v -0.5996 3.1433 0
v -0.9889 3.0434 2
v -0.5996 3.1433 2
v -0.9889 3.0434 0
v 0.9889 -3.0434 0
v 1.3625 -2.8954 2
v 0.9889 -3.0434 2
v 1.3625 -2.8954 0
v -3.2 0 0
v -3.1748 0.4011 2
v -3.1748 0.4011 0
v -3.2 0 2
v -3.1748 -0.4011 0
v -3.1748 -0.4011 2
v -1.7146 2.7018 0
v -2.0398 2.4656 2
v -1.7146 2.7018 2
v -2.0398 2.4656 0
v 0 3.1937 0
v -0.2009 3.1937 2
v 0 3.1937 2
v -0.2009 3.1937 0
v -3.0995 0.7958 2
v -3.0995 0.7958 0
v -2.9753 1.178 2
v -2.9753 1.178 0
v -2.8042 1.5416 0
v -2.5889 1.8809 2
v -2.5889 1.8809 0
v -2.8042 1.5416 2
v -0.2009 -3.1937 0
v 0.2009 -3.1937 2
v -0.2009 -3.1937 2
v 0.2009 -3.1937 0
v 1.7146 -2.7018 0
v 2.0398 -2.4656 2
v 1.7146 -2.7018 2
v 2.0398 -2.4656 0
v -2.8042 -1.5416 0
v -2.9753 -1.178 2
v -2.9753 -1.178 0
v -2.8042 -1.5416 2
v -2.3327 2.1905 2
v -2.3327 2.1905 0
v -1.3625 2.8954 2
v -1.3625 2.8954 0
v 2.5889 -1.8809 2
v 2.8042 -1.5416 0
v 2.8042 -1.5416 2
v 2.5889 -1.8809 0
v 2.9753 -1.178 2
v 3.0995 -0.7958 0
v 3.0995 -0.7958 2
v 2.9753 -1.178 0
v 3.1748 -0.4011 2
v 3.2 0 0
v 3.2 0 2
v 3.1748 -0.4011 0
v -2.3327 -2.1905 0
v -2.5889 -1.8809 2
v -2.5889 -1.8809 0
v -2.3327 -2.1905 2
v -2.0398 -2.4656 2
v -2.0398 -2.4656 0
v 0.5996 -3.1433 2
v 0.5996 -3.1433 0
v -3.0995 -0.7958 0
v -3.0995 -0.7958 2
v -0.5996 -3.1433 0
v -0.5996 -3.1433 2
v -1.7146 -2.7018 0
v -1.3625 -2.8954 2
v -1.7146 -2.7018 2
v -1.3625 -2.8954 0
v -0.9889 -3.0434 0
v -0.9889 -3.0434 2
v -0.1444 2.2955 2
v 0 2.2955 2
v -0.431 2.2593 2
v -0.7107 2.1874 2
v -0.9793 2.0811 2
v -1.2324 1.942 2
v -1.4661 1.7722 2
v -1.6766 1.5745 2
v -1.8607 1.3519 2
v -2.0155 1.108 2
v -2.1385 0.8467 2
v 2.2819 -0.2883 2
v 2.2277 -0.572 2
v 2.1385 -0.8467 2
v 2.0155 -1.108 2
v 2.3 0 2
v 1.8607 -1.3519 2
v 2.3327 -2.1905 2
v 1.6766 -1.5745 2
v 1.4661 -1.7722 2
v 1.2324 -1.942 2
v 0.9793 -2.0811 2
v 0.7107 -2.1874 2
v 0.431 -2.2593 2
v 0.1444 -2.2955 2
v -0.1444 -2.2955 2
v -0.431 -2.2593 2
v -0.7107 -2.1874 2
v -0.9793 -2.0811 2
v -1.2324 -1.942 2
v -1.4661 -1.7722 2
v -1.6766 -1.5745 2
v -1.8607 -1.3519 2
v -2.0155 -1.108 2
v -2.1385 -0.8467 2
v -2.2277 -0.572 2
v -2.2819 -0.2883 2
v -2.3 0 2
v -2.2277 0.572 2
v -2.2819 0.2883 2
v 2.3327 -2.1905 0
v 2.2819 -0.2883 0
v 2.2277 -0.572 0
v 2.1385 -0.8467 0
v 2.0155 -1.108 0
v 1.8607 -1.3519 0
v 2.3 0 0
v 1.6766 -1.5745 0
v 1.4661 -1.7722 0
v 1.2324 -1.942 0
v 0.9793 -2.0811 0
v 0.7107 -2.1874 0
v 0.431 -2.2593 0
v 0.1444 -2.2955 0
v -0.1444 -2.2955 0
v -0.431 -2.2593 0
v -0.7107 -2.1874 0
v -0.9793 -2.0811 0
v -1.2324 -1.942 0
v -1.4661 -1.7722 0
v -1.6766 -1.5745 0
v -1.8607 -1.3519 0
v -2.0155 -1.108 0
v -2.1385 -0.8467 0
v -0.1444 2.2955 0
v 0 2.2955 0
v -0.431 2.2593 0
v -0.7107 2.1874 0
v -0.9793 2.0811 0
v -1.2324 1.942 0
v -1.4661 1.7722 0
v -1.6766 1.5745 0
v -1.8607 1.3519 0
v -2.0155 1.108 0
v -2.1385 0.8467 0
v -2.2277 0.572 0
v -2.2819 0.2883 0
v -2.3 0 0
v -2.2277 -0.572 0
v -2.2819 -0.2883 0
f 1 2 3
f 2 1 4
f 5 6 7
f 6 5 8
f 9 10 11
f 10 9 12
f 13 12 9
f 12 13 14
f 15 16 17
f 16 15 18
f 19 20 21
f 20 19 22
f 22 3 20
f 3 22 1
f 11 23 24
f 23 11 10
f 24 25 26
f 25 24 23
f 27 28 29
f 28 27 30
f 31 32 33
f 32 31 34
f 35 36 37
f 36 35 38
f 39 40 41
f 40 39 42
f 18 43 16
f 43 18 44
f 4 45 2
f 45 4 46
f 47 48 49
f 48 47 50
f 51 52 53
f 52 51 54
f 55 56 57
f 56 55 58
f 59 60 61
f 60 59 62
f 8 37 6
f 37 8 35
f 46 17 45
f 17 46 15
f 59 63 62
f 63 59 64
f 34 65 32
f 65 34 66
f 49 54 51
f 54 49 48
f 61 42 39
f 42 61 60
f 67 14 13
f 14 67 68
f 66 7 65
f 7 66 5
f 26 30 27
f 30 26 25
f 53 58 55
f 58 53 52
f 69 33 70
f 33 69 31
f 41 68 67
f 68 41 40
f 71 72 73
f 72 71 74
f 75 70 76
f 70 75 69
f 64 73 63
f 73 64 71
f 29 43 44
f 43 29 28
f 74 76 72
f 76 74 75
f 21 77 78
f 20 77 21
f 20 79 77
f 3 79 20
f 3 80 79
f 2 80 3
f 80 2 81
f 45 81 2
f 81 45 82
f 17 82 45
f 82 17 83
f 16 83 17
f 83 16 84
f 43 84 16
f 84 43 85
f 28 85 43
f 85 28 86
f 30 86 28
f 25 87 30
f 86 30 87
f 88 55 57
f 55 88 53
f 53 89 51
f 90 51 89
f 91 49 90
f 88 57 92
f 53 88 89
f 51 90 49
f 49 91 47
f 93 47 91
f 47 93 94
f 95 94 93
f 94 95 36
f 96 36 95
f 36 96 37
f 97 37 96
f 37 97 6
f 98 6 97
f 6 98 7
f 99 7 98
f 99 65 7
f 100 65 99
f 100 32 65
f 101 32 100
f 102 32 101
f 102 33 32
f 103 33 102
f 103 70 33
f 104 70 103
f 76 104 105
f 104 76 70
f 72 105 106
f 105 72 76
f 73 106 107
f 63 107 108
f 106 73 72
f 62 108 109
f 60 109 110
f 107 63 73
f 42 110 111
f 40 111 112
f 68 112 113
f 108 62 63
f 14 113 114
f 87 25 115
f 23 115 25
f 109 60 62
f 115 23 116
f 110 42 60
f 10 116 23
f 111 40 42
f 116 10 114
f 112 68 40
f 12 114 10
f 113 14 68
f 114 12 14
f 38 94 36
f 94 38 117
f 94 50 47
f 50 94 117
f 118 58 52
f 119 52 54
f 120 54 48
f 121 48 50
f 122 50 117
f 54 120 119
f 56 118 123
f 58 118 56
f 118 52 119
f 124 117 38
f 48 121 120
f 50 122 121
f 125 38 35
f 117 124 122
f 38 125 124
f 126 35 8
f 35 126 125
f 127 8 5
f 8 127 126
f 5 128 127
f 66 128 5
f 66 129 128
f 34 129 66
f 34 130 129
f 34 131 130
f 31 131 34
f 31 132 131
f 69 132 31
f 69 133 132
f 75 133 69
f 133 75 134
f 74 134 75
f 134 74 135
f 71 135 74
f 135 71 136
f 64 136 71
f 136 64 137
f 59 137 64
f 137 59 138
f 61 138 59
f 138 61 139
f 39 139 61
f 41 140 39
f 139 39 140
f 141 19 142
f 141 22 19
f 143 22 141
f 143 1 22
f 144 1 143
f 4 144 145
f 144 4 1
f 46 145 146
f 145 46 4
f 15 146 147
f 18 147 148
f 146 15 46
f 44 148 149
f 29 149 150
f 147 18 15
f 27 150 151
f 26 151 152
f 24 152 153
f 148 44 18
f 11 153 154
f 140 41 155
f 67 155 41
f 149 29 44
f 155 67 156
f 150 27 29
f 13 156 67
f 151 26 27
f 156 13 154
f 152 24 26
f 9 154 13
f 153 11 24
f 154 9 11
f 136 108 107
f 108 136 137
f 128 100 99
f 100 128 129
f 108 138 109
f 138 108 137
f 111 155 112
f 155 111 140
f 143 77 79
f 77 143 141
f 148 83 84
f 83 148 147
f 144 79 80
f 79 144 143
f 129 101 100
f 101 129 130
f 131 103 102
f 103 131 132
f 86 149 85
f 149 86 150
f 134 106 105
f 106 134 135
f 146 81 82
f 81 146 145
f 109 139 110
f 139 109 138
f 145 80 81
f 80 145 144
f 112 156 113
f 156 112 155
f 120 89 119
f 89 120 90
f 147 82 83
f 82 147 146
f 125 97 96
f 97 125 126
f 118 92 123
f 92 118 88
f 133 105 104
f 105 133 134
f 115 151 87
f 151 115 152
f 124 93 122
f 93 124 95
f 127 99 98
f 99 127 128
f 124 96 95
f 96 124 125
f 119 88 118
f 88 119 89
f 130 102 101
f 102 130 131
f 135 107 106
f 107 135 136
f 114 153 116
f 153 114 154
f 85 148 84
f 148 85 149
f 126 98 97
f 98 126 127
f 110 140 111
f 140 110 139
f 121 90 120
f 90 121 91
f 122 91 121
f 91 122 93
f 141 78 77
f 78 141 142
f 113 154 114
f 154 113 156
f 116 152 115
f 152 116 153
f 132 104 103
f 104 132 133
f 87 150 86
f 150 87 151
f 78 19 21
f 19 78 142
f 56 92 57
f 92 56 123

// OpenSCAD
difference(){
    cylinder( r = 3.2, h = 2, $fn = 50  );
    translate( [ 0, 0, -1 ] )
        cylinder( r = 2.3, h = 4, $fn = 50  );
    translate( [ 0, 0, -1 ] )
        cube( [ 5, 5 ,4 ]  );
}
